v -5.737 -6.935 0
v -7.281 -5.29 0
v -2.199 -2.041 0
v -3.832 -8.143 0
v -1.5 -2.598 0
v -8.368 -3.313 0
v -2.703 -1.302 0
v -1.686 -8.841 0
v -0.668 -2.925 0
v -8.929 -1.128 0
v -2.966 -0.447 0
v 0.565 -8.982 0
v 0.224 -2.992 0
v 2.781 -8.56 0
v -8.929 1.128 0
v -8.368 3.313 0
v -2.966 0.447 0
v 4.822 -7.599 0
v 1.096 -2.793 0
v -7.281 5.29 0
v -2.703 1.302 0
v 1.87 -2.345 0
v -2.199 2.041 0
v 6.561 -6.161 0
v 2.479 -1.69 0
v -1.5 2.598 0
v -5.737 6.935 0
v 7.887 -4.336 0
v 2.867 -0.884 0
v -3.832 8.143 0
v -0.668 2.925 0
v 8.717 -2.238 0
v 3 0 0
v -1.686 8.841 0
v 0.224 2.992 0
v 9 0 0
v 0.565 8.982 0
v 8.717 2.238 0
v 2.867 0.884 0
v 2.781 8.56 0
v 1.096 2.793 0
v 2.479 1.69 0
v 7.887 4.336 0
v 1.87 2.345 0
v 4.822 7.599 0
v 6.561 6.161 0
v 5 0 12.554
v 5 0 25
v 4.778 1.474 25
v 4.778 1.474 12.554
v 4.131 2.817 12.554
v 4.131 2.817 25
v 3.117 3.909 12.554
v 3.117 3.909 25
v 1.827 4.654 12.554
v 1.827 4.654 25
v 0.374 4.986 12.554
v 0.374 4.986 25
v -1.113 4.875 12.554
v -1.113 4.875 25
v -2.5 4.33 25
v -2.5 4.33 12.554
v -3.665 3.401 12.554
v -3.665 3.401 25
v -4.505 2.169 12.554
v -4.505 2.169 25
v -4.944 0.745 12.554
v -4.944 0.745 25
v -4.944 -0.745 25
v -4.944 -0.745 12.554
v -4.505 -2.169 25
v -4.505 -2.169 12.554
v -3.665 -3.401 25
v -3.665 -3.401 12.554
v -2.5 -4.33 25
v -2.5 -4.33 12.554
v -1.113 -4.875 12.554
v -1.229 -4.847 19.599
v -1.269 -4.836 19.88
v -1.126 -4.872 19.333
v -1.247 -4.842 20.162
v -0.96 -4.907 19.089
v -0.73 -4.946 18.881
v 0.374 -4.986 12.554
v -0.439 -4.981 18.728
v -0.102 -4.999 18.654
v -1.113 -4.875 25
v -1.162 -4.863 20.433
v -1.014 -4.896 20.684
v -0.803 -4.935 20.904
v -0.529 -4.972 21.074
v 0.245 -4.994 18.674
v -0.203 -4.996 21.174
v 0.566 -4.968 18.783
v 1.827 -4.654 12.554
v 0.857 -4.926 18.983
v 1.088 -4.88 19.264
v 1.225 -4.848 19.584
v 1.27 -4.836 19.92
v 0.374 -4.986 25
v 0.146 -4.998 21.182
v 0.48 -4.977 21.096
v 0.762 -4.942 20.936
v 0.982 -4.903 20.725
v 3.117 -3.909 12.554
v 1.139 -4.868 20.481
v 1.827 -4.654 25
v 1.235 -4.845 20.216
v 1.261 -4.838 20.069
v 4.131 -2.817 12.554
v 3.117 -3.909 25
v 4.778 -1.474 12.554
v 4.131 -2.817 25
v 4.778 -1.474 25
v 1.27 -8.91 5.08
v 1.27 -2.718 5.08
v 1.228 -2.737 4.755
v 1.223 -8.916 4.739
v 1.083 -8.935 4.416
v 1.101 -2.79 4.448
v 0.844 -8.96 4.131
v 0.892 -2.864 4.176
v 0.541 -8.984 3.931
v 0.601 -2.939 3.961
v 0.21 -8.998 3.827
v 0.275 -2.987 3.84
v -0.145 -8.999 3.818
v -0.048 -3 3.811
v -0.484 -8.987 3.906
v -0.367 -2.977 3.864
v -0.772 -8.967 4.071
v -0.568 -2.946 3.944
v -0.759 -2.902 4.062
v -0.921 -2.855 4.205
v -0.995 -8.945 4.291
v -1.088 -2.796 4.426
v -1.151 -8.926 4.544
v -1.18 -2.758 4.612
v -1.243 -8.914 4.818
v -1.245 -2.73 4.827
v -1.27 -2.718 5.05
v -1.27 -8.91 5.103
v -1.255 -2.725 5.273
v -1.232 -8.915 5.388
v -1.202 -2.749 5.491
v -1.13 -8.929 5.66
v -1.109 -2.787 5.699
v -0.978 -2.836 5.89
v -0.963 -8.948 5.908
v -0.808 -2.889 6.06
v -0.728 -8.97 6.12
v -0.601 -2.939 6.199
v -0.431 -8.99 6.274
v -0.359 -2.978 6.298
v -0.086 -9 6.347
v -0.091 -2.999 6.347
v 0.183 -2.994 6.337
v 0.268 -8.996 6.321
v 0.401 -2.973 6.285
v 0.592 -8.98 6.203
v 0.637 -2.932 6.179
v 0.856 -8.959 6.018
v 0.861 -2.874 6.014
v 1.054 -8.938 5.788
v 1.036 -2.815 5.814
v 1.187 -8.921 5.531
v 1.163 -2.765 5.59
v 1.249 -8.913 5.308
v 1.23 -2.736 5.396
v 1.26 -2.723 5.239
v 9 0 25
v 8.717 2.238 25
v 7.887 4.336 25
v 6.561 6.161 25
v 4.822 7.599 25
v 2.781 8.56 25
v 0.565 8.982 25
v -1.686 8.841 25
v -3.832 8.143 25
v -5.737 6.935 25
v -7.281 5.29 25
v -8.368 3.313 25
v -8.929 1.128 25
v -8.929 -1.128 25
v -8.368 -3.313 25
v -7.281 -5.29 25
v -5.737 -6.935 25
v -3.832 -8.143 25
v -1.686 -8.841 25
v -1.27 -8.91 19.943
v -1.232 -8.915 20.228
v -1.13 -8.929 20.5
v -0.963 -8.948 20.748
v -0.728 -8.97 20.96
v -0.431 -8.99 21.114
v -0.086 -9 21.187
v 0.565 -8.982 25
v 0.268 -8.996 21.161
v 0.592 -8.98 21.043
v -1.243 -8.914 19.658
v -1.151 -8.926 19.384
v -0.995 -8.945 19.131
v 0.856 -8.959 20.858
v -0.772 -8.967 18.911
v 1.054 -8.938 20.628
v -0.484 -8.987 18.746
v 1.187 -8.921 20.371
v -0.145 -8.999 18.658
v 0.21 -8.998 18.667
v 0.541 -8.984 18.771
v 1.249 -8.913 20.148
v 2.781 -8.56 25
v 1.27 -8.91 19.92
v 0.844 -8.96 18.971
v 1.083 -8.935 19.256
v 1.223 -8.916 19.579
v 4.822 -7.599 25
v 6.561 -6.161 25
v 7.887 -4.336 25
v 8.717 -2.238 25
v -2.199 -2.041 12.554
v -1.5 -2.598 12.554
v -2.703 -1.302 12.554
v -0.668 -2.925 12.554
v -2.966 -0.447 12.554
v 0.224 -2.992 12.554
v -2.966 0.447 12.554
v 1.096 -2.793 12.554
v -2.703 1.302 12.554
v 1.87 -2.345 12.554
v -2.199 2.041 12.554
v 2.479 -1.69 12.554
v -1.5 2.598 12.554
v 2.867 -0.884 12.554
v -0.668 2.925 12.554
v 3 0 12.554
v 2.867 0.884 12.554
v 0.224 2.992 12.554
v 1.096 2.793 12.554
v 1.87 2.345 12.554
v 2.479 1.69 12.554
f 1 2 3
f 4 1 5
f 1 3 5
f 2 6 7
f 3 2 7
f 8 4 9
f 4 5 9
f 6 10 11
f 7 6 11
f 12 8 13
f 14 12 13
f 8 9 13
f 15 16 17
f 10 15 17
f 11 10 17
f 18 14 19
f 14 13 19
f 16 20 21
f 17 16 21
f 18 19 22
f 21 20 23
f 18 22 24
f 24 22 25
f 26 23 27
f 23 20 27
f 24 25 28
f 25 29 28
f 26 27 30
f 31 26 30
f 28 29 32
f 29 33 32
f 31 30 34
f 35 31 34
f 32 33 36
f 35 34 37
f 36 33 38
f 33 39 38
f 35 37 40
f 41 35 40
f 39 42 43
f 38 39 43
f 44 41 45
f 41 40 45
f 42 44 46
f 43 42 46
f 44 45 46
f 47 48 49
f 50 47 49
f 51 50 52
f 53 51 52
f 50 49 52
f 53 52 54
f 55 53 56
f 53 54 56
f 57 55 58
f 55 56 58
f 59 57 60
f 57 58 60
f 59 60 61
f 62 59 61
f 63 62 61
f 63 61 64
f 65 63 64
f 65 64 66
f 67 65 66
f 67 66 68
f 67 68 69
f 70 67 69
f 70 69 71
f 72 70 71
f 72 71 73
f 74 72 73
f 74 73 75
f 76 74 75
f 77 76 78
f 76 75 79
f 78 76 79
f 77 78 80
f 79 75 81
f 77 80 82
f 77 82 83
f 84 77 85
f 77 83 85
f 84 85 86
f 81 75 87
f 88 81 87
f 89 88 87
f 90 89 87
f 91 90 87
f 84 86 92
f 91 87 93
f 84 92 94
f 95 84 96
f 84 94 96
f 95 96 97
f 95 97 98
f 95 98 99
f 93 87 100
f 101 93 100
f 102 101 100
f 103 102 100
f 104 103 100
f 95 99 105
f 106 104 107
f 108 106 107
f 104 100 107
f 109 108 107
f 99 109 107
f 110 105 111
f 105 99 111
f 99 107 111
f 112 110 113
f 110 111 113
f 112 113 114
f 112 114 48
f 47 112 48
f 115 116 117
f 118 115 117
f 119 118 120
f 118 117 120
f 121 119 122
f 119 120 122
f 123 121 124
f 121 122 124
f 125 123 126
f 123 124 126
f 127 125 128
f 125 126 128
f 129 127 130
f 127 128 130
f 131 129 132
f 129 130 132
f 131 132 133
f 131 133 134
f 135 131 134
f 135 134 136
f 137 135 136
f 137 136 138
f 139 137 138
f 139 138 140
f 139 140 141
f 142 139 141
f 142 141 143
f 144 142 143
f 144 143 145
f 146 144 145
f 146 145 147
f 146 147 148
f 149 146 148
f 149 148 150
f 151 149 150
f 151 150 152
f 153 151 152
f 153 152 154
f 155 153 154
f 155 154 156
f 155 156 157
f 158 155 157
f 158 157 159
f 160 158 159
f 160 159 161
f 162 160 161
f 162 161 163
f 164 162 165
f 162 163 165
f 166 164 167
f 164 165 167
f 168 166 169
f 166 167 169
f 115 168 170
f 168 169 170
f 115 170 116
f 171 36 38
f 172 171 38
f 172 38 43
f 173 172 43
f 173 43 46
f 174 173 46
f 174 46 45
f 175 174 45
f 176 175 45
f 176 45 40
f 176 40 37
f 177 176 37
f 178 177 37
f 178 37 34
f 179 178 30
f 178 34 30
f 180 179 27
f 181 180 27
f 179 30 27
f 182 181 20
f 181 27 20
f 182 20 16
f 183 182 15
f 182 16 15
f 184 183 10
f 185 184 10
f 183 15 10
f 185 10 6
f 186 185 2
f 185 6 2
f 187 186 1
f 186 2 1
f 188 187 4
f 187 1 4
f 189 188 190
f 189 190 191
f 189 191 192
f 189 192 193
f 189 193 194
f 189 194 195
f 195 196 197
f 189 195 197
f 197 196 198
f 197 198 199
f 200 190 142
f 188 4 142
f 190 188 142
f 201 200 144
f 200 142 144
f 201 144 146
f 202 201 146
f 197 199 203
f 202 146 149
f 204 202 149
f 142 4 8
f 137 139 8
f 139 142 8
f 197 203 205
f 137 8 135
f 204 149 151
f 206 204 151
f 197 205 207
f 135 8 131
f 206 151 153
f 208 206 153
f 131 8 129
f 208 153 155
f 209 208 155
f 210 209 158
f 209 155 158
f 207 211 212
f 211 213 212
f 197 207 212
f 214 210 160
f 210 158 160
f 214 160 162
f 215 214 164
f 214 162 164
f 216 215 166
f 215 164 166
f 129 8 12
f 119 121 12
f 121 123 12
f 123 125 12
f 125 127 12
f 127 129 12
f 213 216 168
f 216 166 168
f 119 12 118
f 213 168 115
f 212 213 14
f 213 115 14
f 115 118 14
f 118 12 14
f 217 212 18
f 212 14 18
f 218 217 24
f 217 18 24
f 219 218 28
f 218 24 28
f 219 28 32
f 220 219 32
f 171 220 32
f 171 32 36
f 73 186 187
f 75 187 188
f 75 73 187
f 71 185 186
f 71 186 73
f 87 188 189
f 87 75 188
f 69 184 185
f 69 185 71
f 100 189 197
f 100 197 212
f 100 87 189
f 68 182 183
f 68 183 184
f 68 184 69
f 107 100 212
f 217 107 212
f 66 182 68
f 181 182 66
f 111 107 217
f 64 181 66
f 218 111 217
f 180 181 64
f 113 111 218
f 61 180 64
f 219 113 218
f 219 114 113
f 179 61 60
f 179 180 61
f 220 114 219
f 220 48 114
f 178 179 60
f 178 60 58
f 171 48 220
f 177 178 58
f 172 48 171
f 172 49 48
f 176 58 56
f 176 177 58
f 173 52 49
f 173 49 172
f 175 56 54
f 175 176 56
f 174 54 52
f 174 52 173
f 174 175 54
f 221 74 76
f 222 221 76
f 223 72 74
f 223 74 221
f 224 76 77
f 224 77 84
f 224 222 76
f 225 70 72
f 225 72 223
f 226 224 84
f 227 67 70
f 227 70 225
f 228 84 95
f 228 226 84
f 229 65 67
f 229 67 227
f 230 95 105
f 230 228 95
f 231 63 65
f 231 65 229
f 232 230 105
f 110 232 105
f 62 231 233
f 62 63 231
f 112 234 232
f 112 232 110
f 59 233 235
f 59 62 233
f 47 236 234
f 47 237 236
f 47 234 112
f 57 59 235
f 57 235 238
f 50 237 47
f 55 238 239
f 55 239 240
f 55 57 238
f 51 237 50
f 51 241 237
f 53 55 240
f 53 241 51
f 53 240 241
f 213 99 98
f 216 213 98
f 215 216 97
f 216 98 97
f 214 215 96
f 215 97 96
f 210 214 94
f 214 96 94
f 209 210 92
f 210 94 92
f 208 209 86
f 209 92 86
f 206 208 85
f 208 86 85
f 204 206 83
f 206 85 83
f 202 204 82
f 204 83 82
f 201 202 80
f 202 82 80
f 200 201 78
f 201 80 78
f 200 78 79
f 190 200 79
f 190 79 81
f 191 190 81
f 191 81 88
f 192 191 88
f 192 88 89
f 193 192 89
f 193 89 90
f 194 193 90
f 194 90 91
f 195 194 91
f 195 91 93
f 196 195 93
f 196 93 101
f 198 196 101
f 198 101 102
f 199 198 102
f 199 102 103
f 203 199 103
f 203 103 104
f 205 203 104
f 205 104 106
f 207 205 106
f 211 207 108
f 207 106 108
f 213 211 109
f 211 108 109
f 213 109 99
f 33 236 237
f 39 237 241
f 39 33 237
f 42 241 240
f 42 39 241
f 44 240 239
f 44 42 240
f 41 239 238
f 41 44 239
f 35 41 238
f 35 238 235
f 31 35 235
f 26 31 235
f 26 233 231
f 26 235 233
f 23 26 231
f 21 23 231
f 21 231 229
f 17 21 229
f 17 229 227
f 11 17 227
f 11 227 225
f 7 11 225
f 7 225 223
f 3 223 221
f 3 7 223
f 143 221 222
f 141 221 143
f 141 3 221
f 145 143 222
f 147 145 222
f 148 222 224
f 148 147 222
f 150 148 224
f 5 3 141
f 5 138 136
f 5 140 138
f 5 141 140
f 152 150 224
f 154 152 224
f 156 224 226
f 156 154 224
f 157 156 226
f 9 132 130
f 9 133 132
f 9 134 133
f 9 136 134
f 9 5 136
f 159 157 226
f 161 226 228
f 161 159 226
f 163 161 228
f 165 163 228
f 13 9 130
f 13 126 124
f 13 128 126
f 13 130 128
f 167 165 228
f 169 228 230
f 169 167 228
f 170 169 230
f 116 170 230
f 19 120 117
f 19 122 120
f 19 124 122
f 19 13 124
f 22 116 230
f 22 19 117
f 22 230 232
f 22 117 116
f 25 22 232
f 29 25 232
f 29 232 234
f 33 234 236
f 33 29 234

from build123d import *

# Parameters (mm, degrees)
SKETCH1_R           = 9
SKETCH1_R_2         = 3
BOSS_EXTRUDE1_DEPTH = 25
SKETCH2_R           = 5
CUT_EXTRUDE1_DEPTH  = 12.446
SKETCH3_R           = 1.27
CUT_EXTRUDE2_DEPTH  = 12.446


with BuildPart() as part:
    # Sketch1 → Boss-Extrude1 (new body)
    with BuildSketch(Plane.XY):
        Circle(SKETCH1_R)
        Circle(SKETCH1_R_2, mode=Mode.SUBTRACT)
    extrude(amount=BOSS_EXTRUDE1_DEPTH)

    # Sketch2 → Cut-Extrude1 (cut)
    with BuildSketch(Plane.XY.offset(25)):
        Circle(SKETCH2_R)
    extrude(amount=-CUT_EXTRUDE1_DEPTH, mode=Mode.SUBTRACT)

    # Sketch3 → Cut-Extrude2 (cut)
    with BuildSketch(Plane(origin=(0, 0, 0), x_dir=(1, 0, 0), z_dir=(0, 1, 0))):
        with Locations((0, -5.08)):
            Circle(SKETCH3_R)
        with Locations((0, -19.92)):
            Circle(SKETCH3_R)
    extrude(amount=-CUT_EXTRUDE2_DEPTH, mode=Mode.SUBTRACT)


solid = part.part
